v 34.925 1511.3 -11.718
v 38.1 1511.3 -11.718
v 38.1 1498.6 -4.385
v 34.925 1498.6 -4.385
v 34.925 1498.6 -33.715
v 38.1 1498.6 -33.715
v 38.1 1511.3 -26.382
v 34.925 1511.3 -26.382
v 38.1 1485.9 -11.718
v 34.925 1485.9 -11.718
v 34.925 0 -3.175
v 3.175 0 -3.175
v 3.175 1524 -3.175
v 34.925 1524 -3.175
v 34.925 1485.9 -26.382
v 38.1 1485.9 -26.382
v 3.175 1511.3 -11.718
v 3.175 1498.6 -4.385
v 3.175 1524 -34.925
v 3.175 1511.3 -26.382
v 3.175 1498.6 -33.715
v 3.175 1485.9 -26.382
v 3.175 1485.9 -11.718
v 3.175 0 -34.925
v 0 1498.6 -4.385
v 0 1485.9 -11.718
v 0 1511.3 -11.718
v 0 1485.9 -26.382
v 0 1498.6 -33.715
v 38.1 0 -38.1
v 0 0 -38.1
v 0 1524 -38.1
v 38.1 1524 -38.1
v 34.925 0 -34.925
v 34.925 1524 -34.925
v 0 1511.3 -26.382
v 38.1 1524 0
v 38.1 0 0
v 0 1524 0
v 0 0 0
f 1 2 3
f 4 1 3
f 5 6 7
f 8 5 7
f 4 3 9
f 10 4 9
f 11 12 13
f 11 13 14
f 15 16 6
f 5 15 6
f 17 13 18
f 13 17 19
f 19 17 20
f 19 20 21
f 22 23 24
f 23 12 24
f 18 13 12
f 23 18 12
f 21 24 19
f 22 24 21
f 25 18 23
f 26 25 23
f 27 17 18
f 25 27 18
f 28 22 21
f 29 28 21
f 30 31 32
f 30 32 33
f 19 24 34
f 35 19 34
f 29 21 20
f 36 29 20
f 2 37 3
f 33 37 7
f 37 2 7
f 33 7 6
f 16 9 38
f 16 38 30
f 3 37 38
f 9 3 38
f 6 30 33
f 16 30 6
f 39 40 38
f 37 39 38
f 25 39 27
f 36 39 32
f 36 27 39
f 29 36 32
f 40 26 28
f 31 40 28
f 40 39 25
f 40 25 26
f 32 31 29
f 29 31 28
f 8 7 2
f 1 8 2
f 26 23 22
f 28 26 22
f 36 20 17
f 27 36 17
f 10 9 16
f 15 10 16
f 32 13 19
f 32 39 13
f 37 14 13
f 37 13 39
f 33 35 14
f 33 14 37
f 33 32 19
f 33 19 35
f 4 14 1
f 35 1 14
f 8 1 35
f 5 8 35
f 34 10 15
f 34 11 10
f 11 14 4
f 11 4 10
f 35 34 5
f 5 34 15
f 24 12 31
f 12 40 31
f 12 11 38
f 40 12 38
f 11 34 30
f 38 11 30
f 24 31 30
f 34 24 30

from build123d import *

# Parameters (mm, degrees)
SKETCH1_W           = 38.1
SKETCH1_H           = 38.1
SKETCH1_W_2         = 31.75
SKETCH1_H_2         = 31.75
BOSS_EXTRUDE1_DEPTH = 1524
CUT_EXTRUDE1_DEPTH  = 38.1


with BuildPart() as part:
    # Sketch1 → Boss-Extrude1 (new body)
    with BuildSketch(Plane(origin=(0, 0, 0), x_dir=(1, 0, 0), z_dir=(0, 1, 0))):
        with Locations((19.05, 19.05)):
            Rectangle(SKETCH1_W, SKETCH1_H)
        with Locations((19.05, 19.05)):
            Rectangle(SKETCH1_W_2, SKETCH1_H_2, mode=Mode.SUBTRACT)
    extrude(amount=BOSS_EXTRUDE1_DEPTH)

    # Sketch2 → Cut-Extrude1 (cut)
    with BuildSketch(Plane(origin=(38.1, 0, 0), x_dir=(0, 0, -1), z_dir=(1, 0, 0))):
        Polygon((33.714696837, 1498.6), (26.382348419, 1511.3), (11.717651581, 1511.3), (4.385303163, 1498.6), (11.717651581, 1485.9), (26.382348419, 1485.9), align=None)
    extrude(amount=-CUT_EXTRUDE1_DEPTH, mode=Mode.SUBTRACT)


solid = part.part
